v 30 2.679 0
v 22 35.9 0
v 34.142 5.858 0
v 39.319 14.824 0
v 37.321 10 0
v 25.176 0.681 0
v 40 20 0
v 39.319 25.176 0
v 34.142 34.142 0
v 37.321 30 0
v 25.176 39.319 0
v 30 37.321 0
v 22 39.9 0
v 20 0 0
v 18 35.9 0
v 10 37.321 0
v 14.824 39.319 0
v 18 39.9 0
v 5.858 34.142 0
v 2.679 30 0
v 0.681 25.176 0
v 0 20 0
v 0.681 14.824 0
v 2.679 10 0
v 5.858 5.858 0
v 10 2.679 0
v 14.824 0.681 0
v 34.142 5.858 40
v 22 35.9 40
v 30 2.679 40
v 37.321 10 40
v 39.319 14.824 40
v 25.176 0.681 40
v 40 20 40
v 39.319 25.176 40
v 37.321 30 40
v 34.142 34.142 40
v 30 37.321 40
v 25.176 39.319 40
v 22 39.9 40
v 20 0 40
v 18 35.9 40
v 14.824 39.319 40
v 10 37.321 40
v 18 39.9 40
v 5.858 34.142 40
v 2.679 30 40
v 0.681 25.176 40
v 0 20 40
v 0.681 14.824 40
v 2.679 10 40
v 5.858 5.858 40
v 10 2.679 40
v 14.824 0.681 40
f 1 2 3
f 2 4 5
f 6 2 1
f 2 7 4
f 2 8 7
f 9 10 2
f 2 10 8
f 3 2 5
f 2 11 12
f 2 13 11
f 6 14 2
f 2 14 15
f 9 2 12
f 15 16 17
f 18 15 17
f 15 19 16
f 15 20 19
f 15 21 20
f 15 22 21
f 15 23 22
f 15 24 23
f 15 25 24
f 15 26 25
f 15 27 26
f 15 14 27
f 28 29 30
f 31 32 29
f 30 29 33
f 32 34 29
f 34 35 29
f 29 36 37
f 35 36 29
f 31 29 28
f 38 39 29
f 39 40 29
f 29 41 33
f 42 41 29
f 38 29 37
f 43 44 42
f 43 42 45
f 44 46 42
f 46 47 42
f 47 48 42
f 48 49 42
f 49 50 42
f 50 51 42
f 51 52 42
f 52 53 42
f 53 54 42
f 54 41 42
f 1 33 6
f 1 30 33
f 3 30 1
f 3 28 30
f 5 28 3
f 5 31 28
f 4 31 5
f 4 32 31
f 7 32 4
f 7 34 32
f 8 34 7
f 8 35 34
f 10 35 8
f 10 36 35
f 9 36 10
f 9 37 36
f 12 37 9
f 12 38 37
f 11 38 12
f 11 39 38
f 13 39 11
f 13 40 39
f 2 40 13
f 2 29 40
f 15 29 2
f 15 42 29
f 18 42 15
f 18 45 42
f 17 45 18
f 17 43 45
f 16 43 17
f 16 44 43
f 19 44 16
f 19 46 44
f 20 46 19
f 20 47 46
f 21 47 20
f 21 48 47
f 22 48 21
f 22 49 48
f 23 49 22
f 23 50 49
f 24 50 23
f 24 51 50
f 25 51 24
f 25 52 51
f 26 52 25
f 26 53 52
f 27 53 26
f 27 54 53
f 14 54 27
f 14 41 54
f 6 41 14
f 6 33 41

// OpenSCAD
$fn = 32;

// ----------------------------------------------------------------------
// Keyway shaft: d40 shaft, key 4 x 4 mm
// ----------------------------------------------------------------------

// --- parameters (mm) ---
shaft_r = 20;             // shaft radius
key_w = 4;                // keyway width
key_d = 4;                // keyway depth below the surface line
plate_t = 40;             // shaft length, Z (extrusion height)

shaft_d = 2 * shaft_r;  // shaft diameter
circle_step = 15;  // polygon sampling step, degrees

profile = [[14.824, 39.319], [10, 37.321], [5.858, 34.142], [2.679, 30], [0.681, 25.176], [0, 20], [0.681, 14.824], [2.679, 10], [5.858, 5.858], [10, 2.679], [14.824, 0.681], [20, 0], [25.176, 0.681], [30, 2.679], [34.142, 5.858], [37.321, 10], [39.319, 14.824], [40, 20], [39.319, 25.176], [37.321, 30], [34.142, 34.142], [30, 37.321], [25.176, 39.319], [22, 39.9], [22, 35.9], [18, 35.9], [18, 39.9]];  // primary outline, 27 points, counter clockwise

// --- the one profile operation ---
linear_extrude(height = plate_t) polygon(points = profile);
